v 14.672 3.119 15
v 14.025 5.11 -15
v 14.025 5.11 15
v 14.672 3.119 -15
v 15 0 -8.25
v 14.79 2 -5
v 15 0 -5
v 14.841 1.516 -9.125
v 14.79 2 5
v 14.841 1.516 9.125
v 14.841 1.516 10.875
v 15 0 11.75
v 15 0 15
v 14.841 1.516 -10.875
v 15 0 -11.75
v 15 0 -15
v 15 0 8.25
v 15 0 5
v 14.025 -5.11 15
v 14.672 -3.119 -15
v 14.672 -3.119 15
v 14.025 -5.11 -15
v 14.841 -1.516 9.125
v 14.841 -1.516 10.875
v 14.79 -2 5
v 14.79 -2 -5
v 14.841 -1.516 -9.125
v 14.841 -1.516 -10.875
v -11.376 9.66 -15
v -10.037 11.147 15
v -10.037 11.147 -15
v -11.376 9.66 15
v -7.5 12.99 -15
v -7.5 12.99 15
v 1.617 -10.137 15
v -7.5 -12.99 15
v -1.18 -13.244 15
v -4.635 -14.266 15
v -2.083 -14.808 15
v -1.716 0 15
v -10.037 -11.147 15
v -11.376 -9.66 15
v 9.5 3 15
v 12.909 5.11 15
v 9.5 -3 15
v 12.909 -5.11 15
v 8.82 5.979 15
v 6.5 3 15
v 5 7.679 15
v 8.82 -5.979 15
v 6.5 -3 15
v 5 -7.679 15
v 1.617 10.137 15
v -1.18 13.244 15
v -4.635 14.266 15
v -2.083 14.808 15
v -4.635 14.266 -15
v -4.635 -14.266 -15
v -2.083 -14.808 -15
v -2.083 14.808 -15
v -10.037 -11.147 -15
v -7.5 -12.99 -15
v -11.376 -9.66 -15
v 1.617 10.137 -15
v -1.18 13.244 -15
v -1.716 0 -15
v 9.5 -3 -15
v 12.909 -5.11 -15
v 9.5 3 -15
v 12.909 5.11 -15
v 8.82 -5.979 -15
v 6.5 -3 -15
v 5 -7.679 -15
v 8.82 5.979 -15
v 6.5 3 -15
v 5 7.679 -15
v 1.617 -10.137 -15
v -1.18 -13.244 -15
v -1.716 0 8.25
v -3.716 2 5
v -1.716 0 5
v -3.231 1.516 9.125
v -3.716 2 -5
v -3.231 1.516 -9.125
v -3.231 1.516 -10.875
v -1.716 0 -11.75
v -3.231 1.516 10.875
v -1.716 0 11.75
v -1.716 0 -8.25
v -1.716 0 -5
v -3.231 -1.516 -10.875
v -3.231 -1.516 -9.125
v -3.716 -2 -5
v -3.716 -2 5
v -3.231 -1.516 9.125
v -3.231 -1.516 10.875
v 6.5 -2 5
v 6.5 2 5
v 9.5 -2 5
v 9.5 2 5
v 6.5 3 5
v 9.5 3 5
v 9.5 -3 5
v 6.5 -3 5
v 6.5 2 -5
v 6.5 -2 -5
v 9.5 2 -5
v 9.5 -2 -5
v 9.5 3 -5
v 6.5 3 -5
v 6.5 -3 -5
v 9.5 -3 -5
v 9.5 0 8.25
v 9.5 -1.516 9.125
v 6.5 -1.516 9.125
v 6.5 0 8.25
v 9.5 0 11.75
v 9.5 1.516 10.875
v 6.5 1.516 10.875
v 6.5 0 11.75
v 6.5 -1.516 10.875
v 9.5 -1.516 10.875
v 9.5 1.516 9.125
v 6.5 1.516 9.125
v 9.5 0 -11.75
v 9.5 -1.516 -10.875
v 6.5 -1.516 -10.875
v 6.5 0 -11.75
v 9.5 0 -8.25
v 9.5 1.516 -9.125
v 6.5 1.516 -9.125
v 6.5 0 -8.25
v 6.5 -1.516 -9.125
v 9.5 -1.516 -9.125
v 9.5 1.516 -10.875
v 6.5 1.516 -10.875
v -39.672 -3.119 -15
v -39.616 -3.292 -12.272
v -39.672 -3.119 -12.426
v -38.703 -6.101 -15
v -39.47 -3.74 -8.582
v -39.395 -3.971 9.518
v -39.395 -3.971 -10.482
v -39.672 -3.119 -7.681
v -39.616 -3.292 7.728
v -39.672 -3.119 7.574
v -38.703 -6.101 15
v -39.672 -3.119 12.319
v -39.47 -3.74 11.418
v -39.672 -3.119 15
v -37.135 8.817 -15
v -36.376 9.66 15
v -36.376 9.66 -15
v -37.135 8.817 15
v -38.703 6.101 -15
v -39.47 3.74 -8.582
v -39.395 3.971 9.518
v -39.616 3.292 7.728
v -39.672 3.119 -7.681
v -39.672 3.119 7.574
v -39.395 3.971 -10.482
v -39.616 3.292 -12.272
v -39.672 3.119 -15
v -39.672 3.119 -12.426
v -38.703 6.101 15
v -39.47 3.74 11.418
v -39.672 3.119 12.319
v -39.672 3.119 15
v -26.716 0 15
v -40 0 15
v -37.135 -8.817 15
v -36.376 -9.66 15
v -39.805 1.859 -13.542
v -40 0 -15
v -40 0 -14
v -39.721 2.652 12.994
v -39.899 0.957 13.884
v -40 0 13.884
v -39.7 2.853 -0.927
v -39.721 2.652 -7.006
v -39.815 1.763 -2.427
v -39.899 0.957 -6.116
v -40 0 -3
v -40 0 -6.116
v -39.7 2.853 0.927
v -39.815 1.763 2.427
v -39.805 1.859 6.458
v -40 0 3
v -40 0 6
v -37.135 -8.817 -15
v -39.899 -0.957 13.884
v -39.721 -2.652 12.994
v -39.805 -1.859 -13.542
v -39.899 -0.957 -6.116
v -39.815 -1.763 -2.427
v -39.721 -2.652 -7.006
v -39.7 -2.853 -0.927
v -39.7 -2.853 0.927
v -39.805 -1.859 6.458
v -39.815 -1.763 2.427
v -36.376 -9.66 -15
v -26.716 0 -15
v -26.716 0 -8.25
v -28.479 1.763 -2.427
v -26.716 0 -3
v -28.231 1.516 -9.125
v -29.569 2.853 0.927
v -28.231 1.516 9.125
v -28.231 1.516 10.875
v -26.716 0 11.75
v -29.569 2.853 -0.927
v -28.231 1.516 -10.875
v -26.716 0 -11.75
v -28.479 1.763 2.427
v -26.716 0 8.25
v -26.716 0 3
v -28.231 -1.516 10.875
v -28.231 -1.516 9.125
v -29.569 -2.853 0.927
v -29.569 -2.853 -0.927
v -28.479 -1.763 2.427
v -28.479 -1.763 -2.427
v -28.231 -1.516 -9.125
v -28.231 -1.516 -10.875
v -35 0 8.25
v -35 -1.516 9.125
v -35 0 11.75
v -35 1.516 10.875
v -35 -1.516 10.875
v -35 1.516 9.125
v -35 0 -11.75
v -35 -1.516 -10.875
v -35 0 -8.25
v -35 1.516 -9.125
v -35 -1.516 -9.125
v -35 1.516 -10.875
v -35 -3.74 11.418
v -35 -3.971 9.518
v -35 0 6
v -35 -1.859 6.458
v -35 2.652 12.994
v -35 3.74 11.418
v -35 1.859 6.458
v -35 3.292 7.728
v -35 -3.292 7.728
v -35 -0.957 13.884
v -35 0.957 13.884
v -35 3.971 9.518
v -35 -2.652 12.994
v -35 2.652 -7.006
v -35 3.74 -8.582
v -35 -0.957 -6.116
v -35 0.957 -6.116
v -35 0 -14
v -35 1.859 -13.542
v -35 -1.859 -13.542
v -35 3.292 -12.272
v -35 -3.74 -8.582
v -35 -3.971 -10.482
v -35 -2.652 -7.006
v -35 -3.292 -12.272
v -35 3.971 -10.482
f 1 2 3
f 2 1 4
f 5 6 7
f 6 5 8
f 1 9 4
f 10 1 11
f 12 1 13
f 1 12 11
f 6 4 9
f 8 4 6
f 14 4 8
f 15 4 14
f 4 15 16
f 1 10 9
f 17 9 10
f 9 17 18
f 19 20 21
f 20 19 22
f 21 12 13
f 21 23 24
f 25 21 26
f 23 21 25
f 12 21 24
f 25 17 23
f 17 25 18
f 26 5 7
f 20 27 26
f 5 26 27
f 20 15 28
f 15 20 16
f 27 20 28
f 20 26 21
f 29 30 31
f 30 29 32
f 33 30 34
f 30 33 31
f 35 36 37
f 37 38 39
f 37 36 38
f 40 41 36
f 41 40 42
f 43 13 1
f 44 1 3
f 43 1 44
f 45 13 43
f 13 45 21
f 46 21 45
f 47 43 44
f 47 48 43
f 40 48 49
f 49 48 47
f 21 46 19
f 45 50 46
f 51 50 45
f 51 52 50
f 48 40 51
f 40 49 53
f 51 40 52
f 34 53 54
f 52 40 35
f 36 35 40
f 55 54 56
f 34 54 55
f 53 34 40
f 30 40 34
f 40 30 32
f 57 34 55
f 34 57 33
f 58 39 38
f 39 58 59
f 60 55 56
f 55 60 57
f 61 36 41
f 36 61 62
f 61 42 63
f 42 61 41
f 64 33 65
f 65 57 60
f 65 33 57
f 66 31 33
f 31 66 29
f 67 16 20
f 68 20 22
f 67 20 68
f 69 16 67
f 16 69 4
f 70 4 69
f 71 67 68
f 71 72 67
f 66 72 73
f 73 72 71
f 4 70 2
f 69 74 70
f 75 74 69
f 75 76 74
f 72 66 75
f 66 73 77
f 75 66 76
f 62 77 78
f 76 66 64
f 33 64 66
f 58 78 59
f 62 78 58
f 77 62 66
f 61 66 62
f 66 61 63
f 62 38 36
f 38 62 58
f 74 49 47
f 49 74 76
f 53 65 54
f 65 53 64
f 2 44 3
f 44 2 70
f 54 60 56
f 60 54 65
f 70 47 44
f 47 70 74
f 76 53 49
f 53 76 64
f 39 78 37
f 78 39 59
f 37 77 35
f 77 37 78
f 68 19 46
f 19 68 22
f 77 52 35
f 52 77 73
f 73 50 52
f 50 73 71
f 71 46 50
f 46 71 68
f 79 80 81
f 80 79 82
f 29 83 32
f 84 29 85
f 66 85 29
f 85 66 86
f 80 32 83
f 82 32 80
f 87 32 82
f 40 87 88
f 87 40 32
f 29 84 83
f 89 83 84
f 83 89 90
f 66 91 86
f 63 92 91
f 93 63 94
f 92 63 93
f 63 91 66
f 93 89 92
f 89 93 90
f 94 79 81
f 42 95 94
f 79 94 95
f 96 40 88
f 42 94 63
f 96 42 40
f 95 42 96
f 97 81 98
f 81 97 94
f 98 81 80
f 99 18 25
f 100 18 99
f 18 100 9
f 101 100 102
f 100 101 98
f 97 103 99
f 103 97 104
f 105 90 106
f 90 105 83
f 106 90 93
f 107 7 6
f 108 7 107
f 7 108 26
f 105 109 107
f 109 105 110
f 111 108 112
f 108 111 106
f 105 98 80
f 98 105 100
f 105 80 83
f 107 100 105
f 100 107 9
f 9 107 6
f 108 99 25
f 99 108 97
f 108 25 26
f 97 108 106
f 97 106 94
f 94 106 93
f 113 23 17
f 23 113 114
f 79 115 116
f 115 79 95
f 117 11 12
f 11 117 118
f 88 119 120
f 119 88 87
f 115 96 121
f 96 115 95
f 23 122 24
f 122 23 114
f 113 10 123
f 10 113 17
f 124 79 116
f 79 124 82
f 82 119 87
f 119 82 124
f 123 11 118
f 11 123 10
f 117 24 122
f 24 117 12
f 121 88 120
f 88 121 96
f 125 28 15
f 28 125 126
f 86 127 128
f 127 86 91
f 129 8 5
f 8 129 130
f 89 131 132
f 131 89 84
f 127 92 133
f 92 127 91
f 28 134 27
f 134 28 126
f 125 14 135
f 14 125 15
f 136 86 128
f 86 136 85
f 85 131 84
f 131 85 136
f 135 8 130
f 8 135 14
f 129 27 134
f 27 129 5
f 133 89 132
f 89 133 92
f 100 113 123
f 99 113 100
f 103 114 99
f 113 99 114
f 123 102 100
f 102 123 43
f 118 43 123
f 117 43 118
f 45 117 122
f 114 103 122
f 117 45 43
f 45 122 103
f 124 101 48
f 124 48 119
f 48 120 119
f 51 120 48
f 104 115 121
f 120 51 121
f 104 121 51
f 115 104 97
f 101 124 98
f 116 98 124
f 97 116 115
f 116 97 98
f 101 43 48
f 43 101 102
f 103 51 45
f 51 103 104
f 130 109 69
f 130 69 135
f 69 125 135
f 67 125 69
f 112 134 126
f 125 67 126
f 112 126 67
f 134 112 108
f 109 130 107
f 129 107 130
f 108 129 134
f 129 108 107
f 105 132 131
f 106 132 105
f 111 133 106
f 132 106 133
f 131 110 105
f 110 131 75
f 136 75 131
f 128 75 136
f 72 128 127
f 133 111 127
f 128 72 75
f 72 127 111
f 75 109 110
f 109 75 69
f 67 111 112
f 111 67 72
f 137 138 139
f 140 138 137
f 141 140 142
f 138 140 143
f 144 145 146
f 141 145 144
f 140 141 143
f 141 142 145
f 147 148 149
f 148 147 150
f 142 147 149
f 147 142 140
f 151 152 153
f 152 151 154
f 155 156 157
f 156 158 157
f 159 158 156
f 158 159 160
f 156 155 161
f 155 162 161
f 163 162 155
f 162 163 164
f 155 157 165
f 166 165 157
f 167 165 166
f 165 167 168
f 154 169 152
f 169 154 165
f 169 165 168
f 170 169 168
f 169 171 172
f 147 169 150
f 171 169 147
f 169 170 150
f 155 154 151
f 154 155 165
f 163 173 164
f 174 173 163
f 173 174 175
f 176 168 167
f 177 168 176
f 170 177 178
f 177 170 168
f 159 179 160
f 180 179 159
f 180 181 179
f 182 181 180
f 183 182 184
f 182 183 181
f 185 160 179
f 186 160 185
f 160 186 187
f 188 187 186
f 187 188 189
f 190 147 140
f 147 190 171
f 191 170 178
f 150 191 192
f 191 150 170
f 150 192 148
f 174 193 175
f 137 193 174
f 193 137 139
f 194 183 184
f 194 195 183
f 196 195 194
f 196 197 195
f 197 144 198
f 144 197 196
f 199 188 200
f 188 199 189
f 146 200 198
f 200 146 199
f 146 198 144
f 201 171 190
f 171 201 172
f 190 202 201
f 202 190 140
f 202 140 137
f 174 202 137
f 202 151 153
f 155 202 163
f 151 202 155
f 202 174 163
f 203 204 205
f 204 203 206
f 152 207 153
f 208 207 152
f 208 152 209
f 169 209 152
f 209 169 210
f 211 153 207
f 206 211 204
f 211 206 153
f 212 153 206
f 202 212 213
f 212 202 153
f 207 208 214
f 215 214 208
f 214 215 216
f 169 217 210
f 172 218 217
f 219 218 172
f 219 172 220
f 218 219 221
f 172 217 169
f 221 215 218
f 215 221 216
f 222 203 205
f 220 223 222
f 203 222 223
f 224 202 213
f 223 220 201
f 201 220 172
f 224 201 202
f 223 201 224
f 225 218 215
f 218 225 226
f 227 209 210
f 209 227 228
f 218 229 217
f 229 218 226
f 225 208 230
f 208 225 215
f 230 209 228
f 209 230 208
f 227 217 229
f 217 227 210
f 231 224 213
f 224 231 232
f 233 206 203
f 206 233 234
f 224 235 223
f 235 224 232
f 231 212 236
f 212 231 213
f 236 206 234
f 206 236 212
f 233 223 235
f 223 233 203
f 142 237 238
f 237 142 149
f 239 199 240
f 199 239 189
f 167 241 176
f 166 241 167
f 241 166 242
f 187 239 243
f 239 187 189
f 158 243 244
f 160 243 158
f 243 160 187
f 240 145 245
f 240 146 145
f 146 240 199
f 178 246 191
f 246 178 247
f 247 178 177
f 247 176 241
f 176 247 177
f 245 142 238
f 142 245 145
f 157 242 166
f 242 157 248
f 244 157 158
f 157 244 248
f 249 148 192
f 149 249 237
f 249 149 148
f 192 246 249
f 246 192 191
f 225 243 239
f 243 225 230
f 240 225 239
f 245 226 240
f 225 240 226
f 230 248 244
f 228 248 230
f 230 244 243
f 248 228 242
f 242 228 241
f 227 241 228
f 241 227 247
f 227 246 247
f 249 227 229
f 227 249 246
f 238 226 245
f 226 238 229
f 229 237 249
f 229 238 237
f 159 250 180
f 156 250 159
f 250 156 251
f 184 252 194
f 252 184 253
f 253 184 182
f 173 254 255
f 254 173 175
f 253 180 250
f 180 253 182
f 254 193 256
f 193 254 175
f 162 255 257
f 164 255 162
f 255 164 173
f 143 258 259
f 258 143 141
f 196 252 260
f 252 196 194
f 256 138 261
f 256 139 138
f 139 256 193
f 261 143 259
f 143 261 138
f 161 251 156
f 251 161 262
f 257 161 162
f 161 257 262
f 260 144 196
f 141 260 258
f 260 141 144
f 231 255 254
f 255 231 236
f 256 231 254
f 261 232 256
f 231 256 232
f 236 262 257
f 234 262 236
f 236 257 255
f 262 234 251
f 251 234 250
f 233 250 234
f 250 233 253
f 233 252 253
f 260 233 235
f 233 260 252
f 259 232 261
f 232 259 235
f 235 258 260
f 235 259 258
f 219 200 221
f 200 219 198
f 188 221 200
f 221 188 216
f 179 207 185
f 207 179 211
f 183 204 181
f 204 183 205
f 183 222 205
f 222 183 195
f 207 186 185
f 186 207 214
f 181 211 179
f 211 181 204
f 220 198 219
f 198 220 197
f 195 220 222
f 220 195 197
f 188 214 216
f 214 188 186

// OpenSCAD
difference(){
	union(){
		cylinder (r = 15, h = 30, center = true);
		}
	translate ([15, 25, 0])cylinder (r = 20, h = 30, center = true);
	translate ([15, -25, 0])cylinder (r = 20, h = 30, center = true);
	translate ([-30, 0, 0])rotate([0, 0, 45])cube ([40, 40, 30], center = true);
	cube([40, 4, 10], center = true);
	translate([0, 0, 10])rotate([0, 90, 0])cylinder (r = 3.5/2, h = 30, center = true);
	translate([0, 0, -10])rotate([0, 90, 0])cylinder (r = 3.5/2, h = 30, center = true);
	translate([8, 0, 10])cube([3,6,10], center = true);
	translate([8, 0, -10])cube([3,6,10], center = true);

};

translate([-25, 0, 0])
difference(){
	intersection(){
		union(){
			cylinder (r = 15, h = 30, center = true);
			}
		translate ([-30, 0, 0])rotate([0, 0, 45])cube ([40, 40, 30], center = true);

	}
	translate([0, 0, 10])rotate([0, 90, 0])cylinder (r = 3.5/2, h = 30, center = true);
	translate([0, 0, -10])rotate([0, 90, 0])cylinder (r = 3.5/2, h = 30, center = true);
	translate([-15, 0, 10])rotate([0, 90, 0])cylinder (r = 4, h = 10, center = true);
	translate([-15, 0, -10])rotate([0, 90, 0])cylinder (r = 4, h = 10, center = true);
	translate([-5, 0, 0])rotate([0, 90, 0])cylinder (r = 3, h = 20, center = true);

};
